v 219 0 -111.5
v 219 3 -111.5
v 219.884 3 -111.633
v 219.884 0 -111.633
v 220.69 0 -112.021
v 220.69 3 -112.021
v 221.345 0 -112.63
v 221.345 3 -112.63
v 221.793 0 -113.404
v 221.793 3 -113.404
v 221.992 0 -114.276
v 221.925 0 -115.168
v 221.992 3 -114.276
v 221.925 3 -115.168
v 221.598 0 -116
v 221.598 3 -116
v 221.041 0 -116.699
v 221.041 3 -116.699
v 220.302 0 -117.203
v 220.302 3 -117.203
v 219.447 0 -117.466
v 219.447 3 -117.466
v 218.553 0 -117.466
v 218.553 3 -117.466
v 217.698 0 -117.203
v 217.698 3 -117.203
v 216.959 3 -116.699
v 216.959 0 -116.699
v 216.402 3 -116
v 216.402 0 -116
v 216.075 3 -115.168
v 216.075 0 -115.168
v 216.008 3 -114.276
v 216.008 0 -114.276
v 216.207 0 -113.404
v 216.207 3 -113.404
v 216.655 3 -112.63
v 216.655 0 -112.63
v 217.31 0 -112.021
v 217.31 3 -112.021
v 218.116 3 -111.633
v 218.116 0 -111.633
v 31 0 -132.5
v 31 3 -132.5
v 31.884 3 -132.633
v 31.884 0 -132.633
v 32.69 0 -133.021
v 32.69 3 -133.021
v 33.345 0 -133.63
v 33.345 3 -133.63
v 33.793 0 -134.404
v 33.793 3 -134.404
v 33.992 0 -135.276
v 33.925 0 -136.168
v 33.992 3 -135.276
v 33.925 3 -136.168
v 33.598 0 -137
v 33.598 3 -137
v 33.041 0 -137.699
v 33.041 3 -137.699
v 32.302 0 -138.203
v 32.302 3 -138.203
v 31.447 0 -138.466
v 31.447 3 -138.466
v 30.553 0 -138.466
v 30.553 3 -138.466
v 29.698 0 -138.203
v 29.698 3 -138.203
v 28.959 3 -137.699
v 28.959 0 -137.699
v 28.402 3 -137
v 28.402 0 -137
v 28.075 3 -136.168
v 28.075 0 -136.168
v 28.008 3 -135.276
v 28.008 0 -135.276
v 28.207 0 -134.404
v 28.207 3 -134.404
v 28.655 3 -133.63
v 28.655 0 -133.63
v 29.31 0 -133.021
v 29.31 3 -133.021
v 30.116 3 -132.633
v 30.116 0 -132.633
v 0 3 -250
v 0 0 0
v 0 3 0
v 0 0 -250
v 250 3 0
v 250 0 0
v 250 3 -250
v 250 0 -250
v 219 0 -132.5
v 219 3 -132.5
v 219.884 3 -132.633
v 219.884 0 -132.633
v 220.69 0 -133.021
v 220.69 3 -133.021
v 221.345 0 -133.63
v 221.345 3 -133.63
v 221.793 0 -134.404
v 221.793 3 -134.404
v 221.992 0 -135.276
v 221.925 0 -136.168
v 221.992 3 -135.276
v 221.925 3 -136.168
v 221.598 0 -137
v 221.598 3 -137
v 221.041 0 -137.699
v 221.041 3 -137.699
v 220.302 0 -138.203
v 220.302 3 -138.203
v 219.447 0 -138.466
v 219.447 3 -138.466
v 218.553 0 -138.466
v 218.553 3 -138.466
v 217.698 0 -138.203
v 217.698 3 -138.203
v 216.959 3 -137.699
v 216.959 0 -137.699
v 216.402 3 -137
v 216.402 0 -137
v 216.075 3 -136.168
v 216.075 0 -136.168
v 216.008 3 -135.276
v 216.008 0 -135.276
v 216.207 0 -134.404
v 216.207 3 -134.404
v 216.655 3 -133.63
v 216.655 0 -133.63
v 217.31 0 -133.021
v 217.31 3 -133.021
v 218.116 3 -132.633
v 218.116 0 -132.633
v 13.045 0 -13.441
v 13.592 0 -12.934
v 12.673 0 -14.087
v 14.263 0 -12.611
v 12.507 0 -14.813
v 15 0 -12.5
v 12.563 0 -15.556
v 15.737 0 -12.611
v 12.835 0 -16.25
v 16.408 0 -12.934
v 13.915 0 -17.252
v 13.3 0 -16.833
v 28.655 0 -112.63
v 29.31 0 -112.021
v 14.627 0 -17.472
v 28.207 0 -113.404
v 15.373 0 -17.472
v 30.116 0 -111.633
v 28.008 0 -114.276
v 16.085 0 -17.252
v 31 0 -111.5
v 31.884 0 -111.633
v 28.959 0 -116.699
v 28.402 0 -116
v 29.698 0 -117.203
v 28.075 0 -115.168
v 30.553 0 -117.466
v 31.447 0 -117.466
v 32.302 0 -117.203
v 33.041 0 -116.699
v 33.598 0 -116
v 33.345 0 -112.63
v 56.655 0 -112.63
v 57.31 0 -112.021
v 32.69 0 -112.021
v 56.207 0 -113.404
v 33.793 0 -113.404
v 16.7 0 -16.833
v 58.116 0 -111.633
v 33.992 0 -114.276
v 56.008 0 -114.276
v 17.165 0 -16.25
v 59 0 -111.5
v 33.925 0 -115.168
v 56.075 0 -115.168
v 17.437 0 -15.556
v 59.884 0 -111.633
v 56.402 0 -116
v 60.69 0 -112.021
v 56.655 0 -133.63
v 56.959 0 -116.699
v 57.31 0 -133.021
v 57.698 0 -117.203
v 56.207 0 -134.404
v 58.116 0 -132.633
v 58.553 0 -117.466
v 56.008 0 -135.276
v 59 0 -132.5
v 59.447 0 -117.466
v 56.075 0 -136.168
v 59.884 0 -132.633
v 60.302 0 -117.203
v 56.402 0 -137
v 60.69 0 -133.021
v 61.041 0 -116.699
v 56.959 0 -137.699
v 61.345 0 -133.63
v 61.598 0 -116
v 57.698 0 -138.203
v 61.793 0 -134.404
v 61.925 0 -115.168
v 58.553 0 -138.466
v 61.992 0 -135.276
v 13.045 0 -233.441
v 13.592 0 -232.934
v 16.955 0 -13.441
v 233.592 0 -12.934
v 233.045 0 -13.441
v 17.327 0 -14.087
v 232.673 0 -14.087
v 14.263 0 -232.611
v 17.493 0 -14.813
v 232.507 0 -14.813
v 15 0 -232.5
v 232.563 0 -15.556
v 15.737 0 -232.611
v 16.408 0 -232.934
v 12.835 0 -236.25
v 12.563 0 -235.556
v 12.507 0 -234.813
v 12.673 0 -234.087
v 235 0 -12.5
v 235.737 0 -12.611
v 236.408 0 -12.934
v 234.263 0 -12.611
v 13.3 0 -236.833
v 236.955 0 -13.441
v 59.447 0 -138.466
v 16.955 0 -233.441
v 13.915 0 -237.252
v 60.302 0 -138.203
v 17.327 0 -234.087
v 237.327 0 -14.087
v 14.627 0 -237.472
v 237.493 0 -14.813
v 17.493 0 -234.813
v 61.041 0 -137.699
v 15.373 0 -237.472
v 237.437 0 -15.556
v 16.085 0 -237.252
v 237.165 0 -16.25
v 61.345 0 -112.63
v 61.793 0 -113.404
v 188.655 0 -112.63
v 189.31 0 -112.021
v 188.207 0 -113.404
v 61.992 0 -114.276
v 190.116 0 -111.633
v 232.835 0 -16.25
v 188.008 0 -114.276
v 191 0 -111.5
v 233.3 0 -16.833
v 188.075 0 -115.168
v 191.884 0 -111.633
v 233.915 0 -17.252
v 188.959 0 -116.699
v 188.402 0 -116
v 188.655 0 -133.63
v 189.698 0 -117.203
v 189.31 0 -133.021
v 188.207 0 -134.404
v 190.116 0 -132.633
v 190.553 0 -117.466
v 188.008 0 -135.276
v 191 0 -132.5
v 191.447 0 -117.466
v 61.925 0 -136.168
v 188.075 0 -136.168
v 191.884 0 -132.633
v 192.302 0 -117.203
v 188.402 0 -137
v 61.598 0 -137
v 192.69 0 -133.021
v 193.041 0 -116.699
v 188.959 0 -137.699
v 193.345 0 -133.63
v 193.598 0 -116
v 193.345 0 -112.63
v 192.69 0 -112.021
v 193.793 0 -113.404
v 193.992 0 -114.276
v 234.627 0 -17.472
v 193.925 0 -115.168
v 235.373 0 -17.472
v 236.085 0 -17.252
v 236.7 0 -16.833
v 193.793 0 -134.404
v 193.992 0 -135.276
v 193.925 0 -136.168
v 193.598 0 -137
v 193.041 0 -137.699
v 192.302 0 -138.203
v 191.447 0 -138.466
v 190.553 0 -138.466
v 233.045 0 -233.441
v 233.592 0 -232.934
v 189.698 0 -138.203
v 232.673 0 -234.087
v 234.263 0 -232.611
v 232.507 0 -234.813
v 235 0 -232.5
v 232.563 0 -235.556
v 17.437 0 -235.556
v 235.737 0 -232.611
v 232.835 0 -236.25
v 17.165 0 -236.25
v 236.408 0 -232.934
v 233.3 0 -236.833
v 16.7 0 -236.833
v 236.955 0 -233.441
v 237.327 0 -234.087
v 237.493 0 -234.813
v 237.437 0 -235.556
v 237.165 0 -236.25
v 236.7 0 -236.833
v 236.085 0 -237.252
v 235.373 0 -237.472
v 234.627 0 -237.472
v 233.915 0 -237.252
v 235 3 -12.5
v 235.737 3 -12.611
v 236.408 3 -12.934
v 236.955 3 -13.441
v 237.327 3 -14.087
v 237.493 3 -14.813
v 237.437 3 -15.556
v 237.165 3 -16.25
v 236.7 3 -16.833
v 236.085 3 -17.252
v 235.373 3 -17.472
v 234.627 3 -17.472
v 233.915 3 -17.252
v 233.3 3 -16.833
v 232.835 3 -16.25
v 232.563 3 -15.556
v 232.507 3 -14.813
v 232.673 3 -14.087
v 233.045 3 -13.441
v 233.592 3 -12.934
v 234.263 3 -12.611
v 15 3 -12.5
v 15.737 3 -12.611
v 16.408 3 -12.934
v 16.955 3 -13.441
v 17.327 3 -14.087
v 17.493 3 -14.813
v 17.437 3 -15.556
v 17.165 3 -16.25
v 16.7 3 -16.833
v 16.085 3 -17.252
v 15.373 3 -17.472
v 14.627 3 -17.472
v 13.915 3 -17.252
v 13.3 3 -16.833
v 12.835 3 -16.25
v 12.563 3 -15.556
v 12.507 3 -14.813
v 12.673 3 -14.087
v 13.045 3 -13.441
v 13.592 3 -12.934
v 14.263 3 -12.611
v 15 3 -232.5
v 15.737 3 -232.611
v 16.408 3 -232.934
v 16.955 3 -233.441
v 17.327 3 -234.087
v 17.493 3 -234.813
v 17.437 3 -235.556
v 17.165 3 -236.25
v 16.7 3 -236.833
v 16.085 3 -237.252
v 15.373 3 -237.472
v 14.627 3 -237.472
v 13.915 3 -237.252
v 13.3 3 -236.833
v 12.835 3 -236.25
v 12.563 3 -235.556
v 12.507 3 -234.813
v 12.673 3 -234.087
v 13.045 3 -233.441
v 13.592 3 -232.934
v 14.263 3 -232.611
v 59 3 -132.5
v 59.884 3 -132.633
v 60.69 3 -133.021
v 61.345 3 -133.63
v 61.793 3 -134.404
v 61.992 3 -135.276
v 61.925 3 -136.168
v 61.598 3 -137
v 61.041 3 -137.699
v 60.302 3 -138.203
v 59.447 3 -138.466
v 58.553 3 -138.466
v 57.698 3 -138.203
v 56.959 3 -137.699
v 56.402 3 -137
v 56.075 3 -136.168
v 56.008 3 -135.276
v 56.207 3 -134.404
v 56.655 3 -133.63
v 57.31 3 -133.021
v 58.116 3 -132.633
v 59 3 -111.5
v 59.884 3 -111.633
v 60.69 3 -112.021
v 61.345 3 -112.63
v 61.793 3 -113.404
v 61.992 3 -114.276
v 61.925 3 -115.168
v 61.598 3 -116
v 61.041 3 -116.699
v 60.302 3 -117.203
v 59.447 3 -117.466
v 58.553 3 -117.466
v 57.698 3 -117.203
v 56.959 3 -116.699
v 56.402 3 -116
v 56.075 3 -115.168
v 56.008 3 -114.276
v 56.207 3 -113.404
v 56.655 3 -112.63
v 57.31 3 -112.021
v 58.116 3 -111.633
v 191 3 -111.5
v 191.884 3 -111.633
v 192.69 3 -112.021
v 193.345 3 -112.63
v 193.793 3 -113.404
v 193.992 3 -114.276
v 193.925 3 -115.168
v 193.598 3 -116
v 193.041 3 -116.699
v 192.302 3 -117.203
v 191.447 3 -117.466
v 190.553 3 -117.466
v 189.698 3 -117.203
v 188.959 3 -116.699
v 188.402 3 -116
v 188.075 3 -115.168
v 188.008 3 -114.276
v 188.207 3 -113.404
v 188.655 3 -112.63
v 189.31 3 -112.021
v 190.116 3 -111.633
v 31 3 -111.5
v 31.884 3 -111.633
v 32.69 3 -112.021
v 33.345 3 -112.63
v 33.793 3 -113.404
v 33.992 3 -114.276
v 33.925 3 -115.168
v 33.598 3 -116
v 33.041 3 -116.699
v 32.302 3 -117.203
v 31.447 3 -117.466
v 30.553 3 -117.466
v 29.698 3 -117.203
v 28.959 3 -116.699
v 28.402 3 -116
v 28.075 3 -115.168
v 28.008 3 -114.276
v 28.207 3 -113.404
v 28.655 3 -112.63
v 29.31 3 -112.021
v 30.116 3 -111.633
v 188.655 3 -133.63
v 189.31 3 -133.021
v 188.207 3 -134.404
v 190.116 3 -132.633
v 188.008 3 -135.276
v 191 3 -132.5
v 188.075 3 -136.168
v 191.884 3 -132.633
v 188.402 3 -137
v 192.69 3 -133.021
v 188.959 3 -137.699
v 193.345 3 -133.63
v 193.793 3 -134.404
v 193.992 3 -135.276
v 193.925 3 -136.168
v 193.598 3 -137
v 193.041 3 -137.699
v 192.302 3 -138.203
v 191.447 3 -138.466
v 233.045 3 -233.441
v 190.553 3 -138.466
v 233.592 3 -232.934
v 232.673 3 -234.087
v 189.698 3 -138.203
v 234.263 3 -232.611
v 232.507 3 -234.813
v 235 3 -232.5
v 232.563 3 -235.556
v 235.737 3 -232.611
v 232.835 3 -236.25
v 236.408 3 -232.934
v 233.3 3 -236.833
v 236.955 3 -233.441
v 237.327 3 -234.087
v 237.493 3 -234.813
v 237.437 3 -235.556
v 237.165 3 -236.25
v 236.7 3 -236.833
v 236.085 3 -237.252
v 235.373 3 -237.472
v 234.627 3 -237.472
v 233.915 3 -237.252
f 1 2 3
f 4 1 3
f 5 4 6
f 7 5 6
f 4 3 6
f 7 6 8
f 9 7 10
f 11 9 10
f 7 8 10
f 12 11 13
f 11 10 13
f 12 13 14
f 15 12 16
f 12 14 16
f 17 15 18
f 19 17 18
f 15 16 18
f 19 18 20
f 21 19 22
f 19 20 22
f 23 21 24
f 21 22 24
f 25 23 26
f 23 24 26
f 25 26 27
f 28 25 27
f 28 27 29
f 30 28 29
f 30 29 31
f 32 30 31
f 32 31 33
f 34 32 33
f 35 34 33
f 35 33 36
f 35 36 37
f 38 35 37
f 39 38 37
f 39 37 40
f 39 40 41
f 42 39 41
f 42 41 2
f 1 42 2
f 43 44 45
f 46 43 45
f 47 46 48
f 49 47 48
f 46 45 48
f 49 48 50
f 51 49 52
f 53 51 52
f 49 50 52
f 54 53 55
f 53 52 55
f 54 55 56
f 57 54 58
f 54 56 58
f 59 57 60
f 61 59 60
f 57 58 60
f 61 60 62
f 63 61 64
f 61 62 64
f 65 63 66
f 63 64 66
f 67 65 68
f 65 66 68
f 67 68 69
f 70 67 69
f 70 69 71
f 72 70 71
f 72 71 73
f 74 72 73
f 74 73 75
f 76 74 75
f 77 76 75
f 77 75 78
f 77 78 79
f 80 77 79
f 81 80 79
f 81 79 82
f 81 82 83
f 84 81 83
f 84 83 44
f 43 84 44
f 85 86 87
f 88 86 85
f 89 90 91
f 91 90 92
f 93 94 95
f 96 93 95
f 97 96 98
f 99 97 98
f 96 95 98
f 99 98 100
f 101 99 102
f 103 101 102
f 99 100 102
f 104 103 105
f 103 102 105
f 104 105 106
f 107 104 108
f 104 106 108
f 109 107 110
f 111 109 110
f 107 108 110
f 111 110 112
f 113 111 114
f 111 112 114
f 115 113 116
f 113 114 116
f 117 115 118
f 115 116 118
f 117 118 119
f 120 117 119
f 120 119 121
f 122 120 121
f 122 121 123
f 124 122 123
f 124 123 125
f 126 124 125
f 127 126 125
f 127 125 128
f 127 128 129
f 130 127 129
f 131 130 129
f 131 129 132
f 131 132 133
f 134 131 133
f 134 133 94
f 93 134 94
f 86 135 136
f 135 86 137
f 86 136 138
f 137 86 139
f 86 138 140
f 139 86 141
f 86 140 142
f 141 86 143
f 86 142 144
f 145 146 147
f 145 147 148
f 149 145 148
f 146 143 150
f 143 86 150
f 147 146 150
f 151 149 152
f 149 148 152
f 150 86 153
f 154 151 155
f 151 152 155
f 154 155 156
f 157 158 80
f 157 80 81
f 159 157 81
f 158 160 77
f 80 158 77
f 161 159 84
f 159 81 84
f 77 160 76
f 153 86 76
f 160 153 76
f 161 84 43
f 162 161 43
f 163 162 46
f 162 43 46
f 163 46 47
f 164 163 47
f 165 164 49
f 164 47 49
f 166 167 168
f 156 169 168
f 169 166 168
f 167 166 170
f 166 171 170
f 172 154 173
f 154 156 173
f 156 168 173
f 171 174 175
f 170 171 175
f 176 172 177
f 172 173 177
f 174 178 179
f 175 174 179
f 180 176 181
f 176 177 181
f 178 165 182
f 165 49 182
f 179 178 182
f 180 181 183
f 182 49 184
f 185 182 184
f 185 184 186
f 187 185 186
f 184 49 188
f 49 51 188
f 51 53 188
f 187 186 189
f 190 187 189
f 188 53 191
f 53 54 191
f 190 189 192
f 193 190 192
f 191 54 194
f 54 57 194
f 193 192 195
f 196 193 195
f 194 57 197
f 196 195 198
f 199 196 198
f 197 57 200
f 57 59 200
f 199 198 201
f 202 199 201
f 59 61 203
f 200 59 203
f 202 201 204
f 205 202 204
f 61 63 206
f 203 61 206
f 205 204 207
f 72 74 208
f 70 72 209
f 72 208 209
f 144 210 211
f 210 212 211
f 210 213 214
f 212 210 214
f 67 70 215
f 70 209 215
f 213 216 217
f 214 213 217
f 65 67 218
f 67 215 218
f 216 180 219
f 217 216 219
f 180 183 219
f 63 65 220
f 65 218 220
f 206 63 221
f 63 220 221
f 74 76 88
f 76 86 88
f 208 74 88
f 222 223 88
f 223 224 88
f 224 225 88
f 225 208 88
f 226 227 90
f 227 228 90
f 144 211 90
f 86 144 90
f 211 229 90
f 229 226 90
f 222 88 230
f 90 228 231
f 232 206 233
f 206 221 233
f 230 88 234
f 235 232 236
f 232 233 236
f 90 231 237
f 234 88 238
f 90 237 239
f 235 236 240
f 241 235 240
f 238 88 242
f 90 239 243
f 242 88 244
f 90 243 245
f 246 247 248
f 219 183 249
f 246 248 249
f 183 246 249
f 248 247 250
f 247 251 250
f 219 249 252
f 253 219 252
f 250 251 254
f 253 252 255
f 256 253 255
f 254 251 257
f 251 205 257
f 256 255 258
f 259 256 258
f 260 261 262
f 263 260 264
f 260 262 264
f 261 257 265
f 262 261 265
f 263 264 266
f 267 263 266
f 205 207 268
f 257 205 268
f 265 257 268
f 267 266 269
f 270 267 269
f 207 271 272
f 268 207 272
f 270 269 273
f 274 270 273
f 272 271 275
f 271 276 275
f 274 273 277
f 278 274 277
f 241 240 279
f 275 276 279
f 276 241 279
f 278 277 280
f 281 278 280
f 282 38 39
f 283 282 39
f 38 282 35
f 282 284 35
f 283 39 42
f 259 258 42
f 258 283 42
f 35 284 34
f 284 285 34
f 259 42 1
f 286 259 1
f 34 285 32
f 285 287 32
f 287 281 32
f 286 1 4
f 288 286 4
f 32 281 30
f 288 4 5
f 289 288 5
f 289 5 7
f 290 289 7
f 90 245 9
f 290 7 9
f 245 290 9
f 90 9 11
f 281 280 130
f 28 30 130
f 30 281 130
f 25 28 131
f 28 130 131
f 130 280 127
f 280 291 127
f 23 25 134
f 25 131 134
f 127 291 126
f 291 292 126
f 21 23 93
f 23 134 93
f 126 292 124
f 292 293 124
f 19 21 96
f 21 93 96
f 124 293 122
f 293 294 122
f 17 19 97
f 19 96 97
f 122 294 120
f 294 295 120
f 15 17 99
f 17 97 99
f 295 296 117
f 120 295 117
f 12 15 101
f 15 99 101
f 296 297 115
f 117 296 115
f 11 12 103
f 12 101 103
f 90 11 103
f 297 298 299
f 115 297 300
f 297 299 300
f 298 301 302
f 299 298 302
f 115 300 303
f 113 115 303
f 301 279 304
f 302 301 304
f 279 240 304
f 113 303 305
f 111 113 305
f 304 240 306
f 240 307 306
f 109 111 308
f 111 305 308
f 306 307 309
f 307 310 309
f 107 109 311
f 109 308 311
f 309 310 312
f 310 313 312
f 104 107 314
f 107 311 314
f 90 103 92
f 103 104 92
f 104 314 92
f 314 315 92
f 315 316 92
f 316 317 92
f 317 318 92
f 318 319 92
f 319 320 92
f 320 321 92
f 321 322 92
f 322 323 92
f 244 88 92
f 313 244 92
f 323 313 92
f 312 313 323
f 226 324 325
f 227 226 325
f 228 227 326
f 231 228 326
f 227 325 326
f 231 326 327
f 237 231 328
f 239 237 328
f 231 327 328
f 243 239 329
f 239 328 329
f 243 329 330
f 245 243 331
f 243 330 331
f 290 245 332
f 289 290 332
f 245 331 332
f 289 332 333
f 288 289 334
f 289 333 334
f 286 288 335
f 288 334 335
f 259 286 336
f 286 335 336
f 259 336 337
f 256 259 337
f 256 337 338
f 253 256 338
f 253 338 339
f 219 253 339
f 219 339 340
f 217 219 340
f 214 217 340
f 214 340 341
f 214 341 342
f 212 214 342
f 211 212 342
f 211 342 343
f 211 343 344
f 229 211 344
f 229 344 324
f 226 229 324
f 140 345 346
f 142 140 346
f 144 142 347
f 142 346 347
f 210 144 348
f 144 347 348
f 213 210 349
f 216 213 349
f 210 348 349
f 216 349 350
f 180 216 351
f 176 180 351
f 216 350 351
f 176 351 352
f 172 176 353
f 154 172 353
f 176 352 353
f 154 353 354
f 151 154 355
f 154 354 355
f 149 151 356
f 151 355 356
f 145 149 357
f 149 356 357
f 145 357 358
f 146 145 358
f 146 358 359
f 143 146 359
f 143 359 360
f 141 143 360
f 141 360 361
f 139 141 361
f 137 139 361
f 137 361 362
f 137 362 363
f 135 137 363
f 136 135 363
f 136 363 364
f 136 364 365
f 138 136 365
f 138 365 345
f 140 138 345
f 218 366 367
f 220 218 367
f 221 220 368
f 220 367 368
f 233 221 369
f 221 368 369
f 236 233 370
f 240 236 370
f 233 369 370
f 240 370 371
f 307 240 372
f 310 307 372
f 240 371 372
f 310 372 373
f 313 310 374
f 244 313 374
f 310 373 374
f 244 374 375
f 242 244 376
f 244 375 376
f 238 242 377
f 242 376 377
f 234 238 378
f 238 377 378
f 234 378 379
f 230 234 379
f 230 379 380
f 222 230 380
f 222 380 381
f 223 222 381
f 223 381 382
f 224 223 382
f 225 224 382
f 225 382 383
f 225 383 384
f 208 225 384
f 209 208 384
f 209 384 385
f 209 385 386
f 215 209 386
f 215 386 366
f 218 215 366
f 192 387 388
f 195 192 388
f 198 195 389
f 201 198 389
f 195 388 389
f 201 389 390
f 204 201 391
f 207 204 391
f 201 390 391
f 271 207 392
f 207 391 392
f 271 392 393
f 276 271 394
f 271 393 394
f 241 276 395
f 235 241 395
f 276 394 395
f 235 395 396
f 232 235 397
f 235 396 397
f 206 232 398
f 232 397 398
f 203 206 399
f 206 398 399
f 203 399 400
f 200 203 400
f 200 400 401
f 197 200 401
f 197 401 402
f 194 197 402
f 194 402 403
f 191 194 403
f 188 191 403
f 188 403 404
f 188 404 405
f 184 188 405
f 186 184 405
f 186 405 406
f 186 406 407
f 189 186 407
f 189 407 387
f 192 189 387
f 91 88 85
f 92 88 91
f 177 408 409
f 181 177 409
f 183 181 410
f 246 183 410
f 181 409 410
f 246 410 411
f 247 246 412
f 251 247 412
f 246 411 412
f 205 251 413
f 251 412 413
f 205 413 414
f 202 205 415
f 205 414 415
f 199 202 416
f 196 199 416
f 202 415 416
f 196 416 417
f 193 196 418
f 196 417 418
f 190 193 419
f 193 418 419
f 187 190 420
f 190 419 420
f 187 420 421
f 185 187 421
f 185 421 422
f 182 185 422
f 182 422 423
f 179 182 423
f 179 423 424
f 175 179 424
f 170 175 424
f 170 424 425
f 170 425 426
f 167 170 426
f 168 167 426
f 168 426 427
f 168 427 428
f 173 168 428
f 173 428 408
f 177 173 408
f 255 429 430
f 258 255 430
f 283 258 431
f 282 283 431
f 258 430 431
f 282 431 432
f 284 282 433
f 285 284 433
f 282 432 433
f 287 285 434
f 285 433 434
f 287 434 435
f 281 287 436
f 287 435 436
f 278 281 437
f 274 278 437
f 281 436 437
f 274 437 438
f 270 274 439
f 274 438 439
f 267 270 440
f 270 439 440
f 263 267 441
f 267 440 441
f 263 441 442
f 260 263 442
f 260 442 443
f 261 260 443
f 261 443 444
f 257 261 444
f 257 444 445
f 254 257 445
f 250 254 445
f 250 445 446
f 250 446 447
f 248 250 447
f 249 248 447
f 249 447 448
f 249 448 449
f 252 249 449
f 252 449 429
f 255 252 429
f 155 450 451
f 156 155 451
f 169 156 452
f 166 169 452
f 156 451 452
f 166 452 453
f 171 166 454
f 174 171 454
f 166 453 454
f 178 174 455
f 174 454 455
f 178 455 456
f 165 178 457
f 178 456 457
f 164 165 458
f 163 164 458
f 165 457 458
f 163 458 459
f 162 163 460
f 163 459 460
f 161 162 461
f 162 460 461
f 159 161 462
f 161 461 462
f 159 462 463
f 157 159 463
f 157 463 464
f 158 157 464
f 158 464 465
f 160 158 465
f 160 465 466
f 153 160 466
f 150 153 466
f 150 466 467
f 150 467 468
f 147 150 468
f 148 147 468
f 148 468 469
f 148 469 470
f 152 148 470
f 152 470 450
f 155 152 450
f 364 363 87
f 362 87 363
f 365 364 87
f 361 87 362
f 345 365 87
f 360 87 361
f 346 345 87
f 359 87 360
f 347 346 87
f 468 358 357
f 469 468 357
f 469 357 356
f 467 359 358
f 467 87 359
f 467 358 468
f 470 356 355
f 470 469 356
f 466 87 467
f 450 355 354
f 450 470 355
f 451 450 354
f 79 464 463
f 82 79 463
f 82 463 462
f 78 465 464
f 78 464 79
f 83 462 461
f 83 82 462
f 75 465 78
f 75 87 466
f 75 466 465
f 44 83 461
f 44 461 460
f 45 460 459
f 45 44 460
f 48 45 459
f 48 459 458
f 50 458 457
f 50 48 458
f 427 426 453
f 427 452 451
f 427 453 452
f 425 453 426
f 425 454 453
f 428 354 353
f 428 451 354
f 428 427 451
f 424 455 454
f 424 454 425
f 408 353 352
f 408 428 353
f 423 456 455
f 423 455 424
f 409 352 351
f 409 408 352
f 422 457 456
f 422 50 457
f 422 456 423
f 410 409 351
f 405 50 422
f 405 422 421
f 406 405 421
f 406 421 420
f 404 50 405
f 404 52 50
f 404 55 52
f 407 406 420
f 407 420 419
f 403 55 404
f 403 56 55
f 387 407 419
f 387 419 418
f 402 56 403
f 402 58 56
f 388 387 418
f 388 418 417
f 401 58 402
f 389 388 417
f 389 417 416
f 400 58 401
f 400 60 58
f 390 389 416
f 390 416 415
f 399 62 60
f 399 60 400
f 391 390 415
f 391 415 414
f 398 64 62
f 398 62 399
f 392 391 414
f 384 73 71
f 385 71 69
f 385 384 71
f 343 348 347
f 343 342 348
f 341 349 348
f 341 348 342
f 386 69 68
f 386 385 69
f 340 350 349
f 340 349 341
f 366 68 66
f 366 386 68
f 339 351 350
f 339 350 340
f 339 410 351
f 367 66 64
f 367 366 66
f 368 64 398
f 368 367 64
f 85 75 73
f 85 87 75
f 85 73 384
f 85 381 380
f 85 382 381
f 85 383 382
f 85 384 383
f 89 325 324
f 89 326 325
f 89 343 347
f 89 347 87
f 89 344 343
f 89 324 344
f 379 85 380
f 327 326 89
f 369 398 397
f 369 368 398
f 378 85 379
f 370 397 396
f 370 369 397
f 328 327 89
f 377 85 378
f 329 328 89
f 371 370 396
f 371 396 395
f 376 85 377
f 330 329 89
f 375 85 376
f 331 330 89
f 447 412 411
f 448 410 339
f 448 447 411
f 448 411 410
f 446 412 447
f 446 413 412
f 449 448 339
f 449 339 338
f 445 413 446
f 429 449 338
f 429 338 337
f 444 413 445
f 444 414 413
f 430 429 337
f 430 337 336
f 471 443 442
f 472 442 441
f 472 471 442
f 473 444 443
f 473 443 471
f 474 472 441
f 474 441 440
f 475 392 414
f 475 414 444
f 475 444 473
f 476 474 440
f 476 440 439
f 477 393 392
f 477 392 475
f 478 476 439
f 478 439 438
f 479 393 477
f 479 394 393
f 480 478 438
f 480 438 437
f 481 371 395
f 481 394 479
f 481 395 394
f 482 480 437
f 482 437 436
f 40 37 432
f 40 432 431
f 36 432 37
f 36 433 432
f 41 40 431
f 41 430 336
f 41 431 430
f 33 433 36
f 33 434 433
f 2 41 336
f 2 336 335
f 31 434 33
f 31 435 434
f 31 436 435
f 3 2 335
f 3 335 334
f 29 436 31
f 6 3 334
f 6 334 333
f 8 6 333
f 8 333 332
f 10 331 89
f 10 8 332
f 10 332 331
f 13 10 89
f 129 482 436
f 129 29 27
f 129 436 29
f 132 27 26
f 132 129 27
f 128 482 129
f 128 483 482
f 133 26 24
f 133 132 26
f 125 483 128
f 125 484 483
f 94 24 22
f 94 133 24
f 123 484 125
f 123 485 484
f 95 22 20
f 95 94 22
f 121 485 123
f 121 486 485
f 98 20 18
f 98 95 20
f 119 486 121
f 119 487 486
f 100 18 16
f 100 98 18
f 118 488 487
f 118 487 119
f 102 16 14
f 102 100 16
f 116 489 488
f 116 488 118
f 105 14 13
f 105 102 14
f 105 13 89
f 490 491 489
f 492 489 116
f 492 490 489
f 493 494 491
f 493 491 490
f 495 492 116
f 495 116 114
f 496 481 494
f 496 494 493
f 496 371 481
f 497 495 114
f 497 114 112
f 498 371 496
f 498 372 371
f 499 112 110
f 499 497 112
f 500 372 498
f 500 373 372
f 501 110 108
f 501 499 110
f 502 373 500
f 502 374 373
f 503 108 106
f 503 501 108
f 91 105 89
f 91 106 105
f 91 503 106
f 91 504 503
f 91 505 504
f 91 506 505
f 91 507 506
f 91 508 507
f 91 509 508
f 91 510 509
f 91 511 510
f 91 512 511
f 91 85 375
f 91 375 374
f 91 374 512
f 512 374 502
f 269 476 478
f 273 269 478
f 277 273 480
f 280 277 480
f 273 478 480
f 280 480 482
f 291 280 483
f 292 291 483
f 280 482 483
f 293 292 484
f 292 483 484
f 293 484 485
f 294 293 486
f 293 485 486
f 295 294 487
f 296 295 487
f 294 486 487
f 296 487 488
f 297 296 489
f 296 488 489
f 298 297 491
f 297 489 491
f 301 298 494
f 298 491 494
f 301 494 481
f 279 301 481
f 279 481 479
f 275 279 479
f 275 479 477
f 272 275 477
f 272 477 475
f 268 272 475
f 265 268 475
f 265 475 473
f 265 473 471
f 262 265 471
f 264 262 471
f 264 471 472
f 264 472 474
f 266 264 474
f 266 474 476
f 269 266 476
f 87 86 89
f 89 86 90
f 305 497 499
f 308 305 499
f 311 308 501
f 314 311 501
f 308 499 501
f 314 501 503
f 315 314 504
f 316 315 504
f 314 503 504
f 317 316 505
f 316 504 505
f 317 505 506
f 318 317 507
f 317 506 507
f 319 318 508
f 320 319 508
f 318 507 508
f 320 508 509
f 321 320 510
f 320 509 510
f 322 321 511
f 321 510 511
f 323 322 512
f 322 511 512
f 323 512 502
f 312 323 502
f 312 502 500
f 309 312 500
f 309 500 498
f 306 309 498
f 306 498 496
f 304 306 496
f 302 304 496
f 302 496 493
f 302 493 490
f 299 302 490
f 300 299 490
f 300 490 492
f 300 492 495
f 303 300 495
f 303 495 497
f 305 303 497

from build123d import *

# Parameters (mm, degrees)
SKETCH1_W           = 250
SKETCH1_H           = 250
BOSS_EXTRUDE1_DEPTH = 3
SKETCH2_R           = 2.5
SKETCH2_R_2         = 3
CUT_EXTRUDE1_DEPTH  = 354.566118286


with BuildPart() as part:
    # Sketch1 → Boss-Extrude1 (new body)
    with BuildSketch(Plane(origin=(0, 0, 0), x_dir=(1, 0, 0), z_dir=(0, 1, 0))):
        with Locations((125, 125)):
            Rectangle(SKETCH1_W, SKETCH1_H)
    extrude(amount=BOSS_EXTRUDE1_DEPTH)

    # Sketch2 → Cut-Extrude1 (cut, through all)
    with BuildSketch(Plane(origin=(0, 3, 0), x_dir=(1, 0, 0), z_dir=(0, 1, 0))):
        with Locations(Location((15, 235, 0), (0, 0, 270))):
            Circle(SKETCH2_R)
        with Locations(Location((235, 235, 0), (0, 0, 270))):
            Circle(SKETCH2_R)
        with Locations(Location((235, 15, 0), (0, 0, 270))):
            Circle(SKETCH2_R)
        with Locations(Location((15, 15, 0), (0, 0, 270))):
            Circle(SKETCH2_R)
        with Locations(Location((31, 135.5, 0), (0, 0, 270))):
            Circle(SKETCH2_R_2)
        with Locations(Location((59, 135.5, 0), (0, 0, 270))):
            Circle(SKETCH2_R_2)
        with Locations(Location((59, 114.5, 0), (0, 0, 270))):
            Circle(SKETCH2_R_2)
        with Locations(Location((31, 114.5, 0), (0, 0, 270))):
            Circle(SKETCH2_R_2)
        with Locations(Location((191, 135.5, 0), (0, 0, 270))):
            Circle(SKETCH2_R_2)
        with Locations(Location((219, 135.5, 0), (0, 0, 270))):
            Circle(SKETCH2_R_2)
        with Locations(Location((219, 114.5, 0), (0, 0, 270))):
            Circle(SKETCH2_R_2)
        with Locations(Location((191, 114.5, 0), (0, 0, 270))):
            Circle(SKETCH2_R_2)
    extrude(amount=-CUT_EXTRUDE1_DEPTH, mode=Mode.SUBTRACT)


solid = part.part
